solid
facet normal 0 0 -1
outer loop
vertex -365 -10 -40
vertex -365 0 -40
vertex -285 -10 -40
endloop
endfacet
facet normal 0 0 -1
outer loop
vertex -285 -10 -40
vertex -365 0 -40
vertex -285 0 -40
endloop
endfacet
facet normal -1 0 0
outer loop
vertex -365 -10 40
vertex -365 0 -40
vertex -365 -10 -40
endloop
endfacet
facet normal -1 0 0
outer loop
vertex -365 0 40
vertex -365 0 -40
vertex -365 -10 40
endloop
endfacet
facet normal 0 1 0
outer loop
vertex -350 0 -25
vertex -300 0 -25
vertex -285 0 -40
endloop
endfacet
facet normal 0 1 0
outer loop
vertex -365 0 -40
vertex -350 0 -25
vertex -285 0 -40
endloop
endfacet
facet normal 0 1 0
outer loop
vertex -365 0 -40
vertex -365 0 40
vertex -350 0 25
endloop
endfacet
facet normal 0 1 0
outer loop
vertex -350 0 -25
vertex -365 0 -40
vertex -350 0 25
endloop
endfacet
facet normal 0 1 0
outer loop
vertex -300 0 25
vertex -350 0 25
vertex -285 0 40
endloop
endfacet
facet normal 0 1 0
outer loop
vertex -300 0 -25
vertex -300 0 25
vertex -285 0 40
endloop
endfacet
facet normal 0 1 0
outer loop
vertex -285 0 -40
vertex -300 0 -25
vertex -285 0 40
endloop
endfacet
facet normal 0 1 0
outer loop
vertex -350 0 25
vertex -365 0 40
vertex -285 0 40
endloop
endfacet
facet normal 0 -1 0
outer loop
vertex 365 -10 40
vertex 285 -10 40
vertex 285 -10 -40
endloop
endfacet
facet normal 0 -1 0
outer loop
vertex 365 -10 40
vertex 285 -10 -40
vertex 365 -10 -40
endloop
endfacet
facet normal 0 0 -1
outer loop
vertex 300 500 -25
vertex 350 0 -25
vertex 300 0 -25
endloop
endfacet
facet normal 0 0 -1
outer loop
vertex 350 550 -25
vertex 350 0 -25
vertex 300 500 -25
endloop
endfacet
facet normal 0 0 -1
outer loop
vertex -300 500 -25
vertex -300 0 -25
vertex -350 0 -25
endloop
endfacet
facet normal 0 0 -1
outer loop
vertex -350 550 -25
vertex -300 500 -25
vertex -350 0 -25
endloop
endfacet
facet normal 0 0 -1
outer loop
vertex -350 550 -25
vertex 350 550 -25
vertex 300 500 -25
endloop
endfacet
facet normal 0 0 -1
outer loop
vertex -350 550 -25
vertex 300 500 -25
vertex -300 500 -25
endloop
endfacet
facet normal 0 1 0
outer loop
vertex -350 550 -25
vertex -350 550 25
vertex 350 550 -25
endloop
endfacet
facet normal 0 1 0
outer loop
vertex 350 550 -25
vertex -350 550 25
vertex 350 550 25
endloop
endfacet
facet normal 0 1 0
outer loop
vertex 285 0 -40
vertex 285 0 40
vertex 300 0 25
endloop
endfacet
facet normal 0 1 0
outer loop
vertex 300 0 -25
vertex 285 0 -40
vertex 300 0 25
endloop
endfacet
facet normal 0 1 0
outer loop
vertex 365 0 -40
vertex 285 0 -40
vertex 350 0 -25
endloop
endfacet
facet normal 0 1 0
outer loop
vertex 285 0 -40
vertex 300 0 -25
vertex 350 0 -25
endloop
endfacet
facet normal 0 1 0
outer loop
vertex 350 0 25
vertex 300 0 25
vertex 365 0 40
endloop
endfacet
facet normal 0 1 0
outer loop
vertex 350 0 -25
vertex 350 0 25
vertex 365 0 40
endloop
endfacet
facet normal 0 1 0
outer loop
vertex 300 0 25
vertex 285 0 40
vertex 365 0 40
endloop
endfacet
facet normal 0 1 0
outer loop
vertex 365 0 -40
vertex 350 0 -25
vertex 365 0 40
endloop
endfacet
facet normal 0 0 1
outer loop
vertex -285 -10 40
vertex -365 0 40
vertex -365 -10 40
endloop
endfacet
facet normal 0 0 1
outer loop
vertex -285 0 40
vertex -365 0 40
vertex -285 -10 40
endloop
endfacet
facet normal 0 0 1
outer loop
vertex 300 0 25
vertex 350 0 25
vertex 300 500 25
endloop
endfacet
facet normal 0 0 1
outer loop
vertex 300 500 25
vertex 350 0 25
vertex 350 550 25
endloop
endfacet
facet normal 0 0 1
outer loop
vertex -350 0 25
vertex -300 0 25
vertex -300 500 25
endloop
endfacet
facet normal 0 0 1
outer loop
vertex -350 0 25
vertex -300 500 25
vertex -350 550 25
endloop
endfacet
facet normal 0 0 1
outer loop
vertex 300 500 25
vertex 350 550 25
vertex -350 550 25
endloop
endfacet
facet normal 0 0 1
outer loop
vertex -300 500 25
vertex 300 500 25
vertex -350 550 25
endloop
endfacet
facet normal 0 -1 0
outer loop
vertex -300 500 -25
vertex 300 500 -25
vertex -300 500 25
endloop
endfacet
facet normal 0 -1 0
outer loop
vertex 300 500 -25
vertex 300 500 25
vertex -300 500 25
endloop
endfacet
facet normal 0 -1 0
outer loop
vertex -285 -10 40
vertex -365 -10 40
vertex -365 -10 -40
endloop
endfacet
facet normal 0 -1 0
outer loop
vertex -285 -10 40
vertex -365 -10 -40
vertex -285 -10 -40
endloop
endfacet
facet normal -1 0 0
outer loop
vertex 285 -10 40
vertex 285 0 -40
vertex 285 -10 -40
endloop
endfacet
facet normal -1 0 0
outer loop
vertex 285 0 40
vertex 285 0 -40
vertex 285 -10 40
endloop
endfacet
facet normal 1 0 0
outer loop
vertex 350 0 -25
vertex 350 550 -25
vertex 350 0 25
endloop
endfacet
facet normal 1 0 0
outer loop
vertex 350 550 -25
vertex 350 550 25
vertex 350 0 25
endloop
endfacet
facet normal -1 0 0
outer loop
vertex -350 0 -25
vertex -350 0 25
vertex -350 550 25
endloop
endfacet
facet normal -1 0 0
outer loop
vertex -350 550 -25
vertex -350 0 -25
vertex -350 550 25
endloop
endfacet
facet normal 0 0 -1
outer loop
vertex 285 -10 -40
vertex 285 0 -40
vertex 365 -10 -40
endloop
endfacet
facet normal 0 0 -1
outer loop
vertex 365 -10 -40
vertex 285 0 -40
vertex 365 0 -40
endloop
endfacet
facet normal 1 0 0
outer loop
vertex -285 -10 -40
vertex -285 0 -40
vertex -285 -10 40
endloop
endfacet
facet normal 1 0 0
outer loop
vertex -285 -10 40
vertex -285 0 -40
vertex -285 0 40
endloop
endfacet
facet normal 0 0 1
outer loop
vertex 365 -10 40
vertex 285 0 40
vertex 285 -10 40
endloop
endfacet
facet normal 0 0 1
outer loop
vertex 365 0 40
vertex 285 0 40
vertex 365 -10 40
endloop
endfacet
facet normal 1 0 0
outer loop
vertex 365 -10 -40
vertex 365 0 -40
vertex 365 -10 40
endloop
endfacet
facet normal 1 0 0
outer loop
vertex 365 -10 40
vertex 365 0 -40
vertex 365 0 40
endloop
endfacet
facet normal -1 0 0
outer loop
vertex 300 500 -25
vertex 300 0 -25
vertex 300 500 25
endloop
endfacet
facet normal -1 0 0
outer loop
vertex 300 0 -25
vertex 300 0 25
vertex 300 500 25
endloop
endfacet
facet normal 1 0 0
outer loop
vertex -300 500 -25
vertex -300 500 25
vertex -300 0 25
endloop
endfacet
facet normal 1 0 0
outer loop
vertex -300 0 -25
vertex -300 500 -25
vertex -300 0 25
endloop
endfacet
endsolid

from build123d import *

# Parameters (mm, degrees)
EXTRUDE_1_DEPTH = 25
SKETCH_2_W      = 80
SKETCH_2_H      = 80
EXTRUDE_2_DEPTH = 10


with BuildPart() as part:
    # 草图1 → 凸台-拉伸1 (new body, symmetric)
    with BuildSketch(Plane.XY):
        Polygon((-350, 0), (-350, 550), (350, 550), (350, 0), (300, 0), (300, 500), (-300, 500), (-300, 0), align=None)
    extrude(amount=EXTRUDE_1_DEPTH, both=True)

    # 草图2 → 凸台-拉伸2 (add)
    with BuildSketch(Plane.XZ):
        with Locations((-325, 0)):
            Rectangle(SKETCH_2_W, SKETCH_2_H)
        with Locations((325, 0)):
            Rectangle(SKETCH_2_W, SKETCH_2_H)
    extrude(amount=EXTRUDE_2_DEPTH)


solid = part.part
